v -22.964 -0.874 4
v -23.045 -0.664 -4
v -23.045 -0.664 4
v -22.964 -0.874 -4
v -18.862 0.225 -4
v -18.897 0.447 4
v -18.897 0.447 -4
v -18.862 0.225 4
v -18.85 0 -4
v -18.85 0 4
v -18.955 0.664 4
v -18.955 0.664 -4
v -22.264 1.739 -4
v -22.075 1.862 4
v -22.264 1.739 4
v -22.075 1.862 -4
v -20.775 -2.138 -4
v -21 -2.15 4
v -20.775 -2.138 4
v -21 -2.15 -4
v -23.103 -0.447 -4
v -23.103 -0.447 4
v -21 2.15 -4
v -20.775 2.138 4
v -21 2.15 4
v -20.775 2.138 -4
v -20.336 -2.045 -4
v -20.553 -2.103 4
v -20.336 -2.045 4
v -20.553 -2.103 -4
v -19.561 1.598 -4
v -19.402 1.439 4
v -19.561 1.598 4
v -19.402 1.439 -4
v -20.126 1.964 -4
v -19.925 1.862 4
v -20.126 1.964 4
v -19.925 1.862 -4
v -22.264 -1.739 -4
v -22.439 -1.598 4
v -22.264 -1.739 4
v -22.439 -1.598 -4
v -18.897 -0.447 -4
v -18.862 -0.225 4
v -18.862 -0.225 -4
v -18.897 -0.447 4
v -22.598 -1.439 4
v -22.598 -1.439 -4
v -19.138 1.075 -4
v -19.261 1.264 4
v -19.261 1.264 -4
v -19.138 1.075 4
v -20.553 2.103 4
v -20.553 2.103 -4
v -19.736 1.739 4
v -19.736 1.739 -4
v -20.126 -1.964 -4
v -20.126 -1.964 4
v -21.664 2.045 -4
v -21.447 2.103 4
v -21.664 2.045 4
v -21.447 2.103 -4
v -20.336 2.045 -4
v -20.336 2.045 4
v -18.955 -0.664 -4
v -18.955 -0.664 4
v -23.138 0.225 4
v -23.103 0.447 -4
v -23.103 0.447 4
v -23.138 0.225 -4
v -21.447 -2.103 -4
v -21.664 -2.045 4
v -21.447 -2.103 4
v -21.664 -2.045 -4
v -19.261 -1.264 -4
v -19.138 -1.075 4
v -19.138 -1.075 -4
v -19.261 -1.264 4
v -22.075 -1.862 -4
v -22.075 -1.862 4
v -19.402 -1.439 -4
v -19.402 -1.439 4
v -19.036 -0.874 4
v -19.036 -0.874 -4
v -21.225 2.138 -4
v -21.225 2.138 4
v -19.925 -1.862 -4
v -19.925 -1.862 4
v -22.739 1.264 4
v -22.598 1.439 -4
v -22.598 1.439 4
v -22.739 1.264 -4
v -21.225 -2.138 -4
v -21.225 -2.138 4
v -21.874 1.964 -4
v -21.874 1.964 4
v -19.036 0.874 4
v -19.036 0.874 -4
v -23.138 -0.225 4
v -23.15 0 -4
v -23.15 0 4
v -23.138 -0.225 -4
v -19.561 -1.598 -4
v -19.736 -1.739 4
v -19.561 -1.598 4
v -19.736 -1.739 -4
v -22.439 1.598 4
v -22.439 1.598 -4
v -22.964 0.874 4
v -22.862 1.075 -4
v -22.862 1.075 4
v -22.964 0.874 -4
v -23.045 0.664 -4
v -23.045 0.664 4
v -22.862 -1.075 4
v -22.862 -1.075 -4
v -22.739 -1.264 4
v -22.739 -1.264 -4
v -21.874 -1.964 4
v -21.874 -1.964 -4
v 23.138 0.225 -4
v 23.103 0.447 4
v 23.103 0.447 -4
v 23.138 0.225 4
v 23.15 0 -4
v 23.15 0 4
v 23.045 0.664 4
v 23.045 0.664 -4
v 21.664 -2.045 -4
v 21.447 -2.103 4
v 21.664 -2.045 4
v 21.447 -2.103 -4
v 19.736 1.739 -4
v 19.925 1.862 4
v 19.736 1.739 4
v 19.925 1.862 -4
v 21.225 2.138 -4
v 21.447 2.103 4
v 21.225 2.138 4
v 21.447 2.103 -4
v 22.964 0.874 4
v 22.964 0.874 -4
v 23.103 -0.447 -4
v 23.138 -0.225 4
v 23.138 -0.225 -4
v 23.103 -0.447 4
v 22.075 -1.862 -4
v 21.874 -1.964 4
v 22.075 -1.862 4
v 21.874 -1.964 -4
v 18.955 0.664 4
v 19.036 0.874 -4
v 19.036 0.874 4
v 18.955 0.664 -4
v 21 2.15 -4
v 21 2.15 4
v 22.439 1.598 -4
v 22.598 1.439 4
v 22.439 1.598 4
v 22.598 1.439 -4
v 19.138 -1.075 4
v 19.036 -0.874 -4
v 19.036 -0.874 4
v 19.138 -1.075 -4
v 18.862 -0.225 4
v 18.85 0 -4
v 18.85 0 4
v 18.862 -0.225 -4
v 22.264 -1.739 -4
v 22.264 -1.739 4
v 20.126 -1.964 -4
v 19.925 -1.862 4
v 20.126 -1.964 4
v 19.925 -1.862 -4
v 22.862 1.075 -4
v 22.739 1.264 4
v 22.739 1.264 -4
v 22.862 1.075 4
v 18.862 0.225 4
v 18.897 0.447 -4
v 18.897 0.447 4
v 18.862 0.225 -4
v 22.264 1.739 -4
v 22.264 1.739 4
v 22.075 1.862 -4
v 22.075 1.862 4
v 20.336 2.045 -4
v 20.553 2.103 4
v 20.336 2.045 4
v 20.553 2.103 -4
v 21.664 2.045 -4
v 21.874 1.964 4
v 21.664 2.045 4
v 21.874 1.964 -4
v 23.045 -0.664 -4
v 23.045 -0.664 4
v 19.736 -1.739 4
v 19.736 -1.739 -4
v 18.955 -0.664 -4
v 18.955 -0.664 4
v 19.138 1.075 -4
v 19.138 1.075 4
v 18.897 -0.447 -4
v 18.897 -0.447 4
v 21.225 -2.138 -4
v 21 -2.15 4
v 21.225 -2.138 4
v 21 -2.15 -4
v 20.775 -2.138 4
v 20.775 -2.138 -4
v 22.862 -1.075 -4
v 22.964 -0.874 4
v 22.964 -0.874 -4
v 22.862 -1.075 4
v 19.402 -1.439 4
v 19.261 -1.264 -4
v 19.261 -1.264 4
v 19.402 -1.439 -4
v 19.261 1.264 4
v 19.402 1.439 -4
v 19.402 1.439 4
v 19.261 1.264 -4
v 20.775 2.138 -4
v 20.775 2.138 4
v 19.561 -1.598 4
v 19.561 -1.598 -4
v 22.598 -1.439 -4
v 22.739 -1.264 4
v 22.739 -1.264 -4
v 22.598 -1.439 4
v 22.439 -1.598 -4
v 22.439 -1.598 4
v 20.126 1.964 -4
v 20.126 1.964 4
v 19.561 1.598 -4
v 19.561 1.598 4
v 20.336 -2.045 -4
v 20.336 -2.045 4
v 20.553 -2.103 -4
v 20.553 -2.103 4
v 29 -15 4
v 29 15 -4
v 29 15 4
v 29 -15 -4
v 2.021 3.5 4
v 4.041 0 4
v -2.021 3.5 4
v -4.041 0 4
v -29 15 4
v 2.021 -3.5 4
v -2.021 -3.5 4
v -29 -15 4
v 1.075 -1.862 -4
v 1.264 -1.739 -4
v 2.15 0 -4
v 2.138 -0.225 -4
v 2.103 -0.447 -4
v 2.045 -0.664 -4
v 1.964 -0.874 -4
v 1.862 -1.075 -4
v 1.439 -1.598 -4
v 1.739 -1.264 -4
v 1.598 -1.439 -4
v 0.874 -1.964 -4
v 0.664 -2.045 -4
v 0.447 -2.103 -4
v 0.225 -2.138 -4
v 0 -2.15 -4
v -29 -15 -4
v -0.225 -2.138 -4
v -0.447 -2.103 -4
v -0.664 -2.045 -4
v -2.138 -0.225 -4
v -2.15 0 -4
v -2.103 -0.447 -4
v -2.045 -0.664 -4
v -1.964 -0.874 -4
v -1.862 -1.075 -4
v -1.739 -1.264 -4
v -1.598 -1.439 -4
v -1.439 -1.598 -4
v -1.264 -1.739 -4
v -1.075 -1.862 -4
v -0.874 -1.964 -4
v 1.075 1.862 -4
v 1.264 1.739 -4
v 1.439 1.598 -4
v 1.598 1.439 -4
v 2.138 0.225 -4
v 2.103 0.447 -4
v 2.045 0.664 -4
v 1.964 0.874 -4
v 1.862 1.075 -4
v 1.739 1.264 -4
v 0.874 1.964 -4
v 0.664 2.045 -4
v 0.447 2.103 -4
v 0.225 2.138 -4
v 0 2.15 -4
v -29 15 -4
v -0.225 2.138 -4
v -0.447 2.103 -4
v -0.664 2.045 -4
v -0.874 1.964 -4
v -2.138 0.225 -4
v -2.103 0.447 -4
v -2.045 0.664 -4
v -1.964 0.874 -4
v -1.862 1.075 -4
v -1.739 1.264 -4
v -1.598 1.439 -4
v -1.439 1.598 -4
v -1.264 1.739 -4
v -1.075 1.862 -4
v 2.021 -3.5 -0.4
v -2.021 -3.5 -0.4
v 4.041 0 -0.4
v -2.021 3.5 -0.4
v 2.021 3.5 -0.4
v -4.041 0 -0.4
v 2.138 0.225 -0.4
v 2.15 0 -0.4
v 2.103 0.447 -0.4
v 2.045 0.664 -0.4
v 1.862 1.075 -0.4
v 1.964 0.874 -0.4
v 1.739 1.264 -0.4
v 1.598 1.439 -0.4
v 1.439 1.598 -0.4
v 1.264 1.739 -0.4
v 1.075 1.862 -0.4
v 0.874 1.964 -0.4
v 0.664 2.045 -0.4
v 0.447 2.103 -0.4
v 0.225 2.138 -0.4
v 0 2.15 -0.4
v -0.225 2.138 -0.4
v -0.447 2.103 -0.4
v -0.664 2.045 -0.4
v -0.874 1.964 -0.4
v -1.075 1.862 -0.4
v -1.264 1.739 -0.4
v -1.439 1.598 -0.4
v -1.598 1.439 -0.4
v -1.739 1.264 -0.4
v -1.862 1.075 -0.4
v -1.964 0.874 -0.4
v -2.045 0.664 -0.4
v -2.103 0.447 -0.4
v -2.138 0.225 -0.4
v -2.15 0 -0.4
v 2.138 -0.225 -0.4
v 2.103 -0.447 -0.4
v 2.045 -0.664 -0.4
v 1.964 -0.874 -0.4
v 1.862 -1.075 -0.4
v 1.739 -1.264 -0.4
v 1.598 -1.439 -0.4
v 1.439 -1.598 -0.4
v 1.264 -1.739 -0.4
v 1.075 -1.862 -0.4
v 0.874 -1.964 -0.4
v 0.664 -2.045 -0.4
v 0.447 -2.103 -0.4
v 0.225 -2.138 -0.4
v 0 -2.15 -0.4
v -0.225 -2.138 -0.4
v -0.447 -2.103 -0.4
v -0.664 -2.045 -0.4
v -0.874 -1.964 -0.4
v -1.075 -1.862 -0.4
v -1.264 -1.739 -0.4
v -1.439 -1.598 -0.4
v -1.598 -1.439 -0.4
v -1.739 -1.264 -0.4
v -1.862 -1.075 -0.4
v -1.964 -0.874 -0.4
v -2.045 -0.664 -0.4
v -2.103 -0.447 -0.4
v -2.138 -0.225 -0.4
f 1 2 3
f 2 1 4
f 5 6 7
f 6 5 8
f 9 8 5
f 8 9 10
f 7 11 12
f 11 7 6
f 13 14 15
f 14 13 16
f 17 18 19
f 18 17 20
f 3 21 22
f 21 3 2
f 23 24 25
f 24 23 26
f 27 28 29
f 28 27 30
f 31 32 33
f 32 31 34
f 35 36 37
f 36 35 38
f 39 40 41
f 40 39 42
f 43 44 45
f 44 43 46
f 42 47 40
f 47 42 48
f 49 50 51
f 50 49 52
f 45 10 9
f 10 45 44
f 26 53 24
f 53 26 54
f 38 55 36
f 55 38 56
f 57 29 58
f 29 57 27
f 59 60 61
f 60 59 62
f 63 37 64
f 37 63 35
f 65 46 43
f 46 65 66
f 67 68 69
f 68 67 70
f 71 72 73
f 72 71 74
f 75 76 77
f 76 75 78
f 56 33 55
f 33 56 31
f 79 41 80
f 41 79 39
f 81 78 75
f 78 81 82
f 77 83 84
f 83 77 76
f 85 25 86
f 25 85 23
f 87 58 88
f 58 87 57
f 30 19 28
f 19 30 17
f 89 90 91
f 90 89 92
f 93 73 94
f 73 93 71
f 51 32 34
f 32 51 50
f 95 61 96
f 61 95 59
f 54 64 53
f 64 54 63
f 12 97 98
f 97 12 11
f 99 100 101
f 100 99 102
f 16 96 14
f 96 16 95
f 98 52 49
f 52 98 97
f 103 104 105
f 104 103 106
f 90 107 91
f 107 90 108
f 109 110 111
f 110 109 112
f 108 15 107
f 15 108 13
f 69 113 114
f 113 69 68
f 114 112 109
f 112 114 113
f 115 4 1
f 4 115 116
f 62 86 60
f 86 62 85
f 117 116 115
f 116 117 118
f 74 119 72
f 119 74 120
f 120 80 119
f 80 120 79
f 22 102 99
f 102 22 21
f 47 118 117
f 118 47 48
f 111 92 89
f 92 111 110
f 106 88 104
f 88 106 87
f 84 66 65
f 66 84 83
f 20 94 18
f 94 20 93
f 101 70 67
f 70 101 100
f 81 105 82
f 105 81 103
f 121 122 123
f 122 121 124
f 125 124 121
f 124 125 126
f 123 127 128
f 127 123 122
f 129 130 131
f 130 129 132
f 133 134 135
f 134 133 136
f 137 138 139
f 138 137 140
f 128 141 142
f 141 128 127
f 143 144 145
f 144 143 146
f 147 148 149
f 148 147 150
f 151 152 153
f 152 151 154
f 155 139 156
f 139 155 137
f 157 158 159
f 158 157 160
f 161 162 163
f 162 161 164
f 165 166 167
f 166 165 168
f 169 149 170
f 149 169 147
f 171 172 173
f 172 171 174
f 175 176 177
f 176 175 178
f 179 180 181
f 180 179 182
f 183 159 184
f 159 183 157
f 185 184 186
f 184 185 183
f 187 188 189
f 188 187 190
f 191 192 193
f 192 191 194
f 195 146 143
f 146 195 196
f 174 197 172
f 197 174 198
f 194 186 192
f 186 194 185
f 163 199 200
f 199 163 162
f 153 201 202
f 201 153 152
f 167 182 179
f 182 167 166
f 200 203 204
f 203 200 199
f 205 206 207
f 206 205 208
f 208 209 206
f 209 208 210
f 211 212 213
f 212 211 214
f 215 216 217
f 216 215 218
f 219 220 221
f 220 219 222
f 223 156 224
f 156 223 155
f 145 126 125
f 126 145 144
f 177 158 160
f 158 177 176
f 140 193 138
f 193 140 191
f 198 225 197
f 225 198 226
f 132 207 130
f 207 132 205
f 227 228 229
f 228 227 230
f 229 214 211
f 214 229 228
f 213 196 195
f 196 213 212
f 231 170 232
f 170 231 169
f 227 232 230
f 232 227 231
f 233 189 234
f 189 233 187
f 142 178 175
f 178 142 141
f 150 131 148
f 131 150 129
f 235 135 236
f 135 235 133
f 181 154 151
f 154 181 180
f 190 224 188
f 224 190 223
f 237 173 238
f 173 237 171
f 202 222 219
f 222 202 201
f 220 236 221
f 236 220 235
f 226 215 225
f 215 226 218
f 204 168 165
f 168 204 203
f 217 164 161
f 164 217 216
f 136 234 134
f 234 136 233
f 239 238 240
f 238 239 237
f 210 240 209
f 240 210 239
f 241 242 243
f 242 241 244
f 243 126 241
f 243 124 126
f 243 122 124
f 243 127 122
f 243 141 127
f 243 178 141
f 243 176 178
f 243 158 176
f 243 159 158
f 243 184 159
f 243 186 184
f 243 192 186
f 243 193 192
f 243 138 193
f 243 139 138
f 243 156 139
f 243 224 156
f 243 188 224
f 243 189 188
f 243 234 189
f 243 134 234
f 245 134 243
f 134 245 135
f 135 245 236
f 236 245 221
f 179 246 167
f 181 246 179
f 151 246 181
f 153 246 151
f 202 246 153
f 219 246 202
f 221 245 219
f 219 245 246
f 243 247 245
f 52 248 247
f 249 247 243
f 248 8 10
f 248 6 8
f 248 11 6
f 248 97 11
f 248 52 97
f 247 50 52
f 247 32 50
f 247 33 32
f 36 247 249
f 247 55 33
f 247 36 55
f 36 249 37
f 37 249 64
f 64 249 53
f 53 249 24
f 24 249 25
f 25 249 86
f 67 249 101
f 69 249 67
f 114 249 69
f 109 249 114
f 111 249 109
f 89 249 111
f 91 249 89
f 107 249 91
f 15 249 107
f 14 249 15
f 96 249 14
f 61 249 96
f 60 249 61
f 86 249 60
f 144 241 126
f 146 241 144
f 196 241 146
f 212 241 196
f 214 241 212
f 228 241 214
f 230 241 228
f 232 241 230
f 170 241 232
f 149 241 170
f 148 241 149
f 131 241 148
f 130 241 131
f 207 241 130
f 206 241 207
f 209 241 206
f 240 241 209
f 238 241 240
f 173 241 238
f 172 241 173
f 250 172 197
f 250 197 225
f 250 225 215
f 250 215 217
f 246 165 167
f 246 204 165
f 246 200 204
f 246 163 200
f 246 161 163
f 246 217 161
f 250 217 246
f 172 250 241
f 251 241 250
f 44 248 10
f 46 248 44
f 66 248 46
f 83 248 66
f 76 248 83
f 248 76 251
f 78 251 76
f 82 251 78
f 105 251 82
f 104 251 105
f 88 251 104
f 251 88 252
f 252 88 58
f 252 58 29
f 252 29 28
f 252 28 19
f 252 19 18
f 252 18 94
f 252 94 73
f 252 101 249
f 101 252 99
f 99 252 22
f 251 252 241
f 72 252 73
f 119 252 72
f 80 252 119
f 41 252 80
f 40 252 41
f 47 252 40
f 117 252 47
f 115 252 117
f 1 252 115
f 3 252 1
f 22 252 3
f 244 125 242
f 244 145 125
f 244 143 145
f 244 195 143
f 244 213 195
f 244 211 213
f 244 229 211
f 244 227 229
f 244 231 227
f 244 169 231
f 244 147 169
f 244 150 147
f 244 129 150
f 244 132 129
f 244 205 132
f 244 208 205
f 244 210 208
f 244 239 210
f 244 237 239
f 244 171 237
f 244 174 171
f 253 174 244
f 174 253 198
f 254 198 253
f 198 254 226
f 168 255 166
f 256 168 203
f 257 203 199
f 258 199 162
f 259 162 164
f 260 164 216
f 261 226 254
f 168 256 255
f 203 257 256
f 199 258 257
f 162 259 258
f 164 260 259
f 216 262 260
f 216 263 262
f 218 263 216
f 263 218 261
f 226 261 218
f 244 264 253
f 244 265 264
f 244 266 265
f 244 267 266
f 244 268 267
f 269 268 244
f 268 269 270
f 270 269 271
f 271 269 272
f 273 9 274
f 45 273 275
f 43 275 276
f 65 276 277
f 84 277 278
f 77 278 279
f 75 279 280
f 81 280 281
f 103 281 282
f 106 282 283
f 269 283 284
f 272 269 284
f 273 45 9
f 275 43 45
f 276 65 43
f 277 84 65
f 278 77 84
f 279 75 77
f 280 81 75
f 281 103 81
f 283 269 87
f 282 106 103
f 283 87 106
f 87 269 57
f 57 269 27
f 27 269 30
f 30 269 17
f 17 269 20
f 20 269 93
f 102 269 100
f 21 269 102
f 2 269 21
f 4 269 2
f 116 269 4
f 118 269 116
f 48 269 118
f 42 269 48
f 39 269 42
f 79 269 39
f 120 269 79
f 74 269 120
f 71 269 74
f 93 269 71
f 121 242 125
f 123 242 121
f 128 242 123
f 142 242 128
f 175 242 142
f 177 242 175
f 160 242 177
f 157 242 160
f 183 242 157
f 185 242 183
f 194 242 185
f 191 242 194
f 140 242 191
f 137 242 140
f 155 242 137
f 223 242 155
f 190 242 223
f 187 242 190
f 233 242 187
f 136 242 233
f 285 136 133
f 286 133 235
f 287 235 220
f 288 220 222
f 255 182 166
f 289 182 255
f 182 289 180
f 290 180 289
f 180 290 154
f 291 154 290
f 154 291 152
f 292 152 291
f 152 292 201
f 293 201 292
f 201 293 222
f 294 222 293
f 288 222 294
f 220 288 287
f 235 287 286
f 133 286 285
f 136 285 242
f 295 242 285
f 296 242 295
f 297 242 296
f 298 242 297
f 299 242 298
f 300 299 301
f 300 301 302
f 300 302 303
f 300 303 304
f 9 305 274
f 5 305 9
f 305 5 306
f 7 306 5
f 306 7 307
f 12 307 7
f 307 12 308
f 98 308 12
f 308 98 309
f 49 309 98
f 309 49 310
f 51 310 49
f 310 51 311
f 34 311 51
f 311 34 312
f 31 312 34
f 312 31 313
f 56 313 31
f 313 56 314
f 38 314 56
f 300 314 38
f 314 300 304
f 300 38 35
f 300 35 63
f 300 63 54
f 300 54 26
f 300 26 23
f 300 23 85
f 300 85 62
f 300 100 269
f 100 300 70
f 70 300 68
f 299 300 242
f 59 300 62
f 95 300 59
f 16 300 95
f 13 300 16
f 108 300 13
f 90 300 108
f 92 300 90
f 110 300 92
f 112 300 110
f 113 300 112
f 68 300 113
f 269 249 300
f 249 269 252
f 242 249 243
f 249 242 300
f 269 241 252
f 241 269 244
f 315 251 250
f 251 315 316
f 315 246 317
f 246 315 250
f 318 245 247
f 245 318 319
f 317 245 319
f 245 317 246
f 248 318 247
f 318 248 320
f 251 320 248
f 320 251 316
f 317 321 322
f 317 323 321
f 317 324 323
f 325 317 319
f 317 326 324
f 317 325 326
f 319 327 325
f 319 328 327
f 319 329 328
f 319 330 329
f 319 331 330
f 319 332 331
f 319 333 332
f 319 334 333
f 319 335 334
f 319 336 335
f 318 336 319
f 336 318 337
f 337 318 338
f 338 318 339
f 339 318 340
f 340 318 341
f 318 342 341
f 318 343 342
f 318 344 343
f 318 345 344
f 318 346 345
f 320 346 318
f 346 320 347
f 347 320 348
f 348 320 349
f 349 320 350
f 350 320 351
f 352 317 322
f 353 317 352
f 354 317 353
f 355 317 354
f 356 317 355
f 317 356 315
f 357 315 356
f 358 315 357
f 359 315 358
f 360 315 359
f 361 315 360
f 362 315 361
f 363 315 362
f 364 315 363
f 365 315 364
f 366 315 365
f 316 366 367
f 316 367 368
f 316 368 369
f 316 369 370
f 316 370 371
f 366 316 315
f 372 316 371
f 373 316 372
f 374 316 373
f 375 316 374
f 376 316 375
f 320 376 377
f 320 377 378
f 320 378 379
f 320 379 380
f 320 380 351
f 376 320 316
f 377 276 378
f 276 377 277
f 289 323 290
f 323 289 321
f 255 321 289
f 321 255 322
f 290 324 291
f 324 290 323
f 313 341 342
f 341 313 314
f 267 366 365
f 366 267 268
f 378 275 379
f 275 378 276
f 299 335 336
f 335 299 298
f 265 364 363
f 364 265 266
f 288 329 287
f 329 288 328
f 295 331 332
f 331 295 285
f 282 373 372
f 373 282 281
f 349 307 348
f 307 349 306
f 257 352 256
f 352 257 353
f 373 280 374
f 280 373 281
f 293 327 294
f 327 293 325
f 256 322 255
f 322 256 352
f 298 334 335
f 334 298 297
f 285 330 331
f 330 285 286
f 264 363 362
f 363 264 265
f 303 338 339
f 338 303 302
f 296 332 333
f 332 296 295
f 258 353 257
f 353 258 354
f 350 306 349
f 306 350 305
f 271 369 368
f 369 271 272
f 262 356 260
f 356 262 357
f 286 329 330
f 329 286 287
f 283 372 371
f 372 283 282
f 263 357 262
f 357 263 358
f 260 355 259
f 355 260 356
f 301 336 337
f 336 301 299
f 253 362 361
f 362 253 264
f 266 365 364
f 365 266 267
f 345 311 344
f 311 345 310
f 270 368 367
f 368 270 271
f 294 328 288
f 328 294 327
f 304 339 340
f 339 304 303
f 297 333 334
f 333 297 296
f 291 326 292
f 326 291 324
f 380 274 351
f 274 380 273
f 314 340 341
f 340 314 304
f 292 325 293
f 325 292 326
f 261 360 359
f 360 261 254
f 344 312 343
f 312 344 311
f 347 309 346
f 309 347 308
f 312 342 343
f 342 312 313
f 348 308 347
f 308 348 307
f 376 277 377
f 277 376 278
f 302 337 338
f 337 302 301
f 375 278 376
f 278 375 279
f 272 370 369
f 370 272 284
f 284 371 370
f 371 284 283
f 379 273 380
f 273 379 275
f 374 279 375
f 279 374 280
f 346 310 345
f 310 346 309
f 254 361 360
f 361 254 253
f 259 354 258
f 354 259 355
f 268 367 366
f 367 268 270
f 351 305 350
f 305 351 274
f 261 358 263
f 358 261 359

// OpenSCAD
// M4 captive-nut plate for compact mechanical fixtures.
$fn = 60;
eps = 0.02;
plate_l = 58;
plate_w = 30;
plate_t = 8;
mount_pitch = 42;
mount_d = 4.3;
nut_flat = 7.0;
nut_depth = 4.4;
thread_clearance_d = 4.3;

// A hex recess is open only from the top, retaining a 3.6 mm bottom web.
difference() {
    cube([plate_l, plate_w, plate_t], center = true);
    for (x = [-mount_pitch / 2, mount_pitch / 2])
        translate([x, 0, -plate_t / 2 - eps]) cylinder(d = mount_d, h = plate_t + 2 * eps);
    translate([0, 0, plate_t / 2 - nut_depth])
        cylinder(d = nut_flat / cos(30), h = nut_depth + eps, $fn = 6);
    translate([0, 0, -plate_t / 2 - eps])
        cylinder(d = thread_clearance_d, h = plate_t + 2 * eps);
}
